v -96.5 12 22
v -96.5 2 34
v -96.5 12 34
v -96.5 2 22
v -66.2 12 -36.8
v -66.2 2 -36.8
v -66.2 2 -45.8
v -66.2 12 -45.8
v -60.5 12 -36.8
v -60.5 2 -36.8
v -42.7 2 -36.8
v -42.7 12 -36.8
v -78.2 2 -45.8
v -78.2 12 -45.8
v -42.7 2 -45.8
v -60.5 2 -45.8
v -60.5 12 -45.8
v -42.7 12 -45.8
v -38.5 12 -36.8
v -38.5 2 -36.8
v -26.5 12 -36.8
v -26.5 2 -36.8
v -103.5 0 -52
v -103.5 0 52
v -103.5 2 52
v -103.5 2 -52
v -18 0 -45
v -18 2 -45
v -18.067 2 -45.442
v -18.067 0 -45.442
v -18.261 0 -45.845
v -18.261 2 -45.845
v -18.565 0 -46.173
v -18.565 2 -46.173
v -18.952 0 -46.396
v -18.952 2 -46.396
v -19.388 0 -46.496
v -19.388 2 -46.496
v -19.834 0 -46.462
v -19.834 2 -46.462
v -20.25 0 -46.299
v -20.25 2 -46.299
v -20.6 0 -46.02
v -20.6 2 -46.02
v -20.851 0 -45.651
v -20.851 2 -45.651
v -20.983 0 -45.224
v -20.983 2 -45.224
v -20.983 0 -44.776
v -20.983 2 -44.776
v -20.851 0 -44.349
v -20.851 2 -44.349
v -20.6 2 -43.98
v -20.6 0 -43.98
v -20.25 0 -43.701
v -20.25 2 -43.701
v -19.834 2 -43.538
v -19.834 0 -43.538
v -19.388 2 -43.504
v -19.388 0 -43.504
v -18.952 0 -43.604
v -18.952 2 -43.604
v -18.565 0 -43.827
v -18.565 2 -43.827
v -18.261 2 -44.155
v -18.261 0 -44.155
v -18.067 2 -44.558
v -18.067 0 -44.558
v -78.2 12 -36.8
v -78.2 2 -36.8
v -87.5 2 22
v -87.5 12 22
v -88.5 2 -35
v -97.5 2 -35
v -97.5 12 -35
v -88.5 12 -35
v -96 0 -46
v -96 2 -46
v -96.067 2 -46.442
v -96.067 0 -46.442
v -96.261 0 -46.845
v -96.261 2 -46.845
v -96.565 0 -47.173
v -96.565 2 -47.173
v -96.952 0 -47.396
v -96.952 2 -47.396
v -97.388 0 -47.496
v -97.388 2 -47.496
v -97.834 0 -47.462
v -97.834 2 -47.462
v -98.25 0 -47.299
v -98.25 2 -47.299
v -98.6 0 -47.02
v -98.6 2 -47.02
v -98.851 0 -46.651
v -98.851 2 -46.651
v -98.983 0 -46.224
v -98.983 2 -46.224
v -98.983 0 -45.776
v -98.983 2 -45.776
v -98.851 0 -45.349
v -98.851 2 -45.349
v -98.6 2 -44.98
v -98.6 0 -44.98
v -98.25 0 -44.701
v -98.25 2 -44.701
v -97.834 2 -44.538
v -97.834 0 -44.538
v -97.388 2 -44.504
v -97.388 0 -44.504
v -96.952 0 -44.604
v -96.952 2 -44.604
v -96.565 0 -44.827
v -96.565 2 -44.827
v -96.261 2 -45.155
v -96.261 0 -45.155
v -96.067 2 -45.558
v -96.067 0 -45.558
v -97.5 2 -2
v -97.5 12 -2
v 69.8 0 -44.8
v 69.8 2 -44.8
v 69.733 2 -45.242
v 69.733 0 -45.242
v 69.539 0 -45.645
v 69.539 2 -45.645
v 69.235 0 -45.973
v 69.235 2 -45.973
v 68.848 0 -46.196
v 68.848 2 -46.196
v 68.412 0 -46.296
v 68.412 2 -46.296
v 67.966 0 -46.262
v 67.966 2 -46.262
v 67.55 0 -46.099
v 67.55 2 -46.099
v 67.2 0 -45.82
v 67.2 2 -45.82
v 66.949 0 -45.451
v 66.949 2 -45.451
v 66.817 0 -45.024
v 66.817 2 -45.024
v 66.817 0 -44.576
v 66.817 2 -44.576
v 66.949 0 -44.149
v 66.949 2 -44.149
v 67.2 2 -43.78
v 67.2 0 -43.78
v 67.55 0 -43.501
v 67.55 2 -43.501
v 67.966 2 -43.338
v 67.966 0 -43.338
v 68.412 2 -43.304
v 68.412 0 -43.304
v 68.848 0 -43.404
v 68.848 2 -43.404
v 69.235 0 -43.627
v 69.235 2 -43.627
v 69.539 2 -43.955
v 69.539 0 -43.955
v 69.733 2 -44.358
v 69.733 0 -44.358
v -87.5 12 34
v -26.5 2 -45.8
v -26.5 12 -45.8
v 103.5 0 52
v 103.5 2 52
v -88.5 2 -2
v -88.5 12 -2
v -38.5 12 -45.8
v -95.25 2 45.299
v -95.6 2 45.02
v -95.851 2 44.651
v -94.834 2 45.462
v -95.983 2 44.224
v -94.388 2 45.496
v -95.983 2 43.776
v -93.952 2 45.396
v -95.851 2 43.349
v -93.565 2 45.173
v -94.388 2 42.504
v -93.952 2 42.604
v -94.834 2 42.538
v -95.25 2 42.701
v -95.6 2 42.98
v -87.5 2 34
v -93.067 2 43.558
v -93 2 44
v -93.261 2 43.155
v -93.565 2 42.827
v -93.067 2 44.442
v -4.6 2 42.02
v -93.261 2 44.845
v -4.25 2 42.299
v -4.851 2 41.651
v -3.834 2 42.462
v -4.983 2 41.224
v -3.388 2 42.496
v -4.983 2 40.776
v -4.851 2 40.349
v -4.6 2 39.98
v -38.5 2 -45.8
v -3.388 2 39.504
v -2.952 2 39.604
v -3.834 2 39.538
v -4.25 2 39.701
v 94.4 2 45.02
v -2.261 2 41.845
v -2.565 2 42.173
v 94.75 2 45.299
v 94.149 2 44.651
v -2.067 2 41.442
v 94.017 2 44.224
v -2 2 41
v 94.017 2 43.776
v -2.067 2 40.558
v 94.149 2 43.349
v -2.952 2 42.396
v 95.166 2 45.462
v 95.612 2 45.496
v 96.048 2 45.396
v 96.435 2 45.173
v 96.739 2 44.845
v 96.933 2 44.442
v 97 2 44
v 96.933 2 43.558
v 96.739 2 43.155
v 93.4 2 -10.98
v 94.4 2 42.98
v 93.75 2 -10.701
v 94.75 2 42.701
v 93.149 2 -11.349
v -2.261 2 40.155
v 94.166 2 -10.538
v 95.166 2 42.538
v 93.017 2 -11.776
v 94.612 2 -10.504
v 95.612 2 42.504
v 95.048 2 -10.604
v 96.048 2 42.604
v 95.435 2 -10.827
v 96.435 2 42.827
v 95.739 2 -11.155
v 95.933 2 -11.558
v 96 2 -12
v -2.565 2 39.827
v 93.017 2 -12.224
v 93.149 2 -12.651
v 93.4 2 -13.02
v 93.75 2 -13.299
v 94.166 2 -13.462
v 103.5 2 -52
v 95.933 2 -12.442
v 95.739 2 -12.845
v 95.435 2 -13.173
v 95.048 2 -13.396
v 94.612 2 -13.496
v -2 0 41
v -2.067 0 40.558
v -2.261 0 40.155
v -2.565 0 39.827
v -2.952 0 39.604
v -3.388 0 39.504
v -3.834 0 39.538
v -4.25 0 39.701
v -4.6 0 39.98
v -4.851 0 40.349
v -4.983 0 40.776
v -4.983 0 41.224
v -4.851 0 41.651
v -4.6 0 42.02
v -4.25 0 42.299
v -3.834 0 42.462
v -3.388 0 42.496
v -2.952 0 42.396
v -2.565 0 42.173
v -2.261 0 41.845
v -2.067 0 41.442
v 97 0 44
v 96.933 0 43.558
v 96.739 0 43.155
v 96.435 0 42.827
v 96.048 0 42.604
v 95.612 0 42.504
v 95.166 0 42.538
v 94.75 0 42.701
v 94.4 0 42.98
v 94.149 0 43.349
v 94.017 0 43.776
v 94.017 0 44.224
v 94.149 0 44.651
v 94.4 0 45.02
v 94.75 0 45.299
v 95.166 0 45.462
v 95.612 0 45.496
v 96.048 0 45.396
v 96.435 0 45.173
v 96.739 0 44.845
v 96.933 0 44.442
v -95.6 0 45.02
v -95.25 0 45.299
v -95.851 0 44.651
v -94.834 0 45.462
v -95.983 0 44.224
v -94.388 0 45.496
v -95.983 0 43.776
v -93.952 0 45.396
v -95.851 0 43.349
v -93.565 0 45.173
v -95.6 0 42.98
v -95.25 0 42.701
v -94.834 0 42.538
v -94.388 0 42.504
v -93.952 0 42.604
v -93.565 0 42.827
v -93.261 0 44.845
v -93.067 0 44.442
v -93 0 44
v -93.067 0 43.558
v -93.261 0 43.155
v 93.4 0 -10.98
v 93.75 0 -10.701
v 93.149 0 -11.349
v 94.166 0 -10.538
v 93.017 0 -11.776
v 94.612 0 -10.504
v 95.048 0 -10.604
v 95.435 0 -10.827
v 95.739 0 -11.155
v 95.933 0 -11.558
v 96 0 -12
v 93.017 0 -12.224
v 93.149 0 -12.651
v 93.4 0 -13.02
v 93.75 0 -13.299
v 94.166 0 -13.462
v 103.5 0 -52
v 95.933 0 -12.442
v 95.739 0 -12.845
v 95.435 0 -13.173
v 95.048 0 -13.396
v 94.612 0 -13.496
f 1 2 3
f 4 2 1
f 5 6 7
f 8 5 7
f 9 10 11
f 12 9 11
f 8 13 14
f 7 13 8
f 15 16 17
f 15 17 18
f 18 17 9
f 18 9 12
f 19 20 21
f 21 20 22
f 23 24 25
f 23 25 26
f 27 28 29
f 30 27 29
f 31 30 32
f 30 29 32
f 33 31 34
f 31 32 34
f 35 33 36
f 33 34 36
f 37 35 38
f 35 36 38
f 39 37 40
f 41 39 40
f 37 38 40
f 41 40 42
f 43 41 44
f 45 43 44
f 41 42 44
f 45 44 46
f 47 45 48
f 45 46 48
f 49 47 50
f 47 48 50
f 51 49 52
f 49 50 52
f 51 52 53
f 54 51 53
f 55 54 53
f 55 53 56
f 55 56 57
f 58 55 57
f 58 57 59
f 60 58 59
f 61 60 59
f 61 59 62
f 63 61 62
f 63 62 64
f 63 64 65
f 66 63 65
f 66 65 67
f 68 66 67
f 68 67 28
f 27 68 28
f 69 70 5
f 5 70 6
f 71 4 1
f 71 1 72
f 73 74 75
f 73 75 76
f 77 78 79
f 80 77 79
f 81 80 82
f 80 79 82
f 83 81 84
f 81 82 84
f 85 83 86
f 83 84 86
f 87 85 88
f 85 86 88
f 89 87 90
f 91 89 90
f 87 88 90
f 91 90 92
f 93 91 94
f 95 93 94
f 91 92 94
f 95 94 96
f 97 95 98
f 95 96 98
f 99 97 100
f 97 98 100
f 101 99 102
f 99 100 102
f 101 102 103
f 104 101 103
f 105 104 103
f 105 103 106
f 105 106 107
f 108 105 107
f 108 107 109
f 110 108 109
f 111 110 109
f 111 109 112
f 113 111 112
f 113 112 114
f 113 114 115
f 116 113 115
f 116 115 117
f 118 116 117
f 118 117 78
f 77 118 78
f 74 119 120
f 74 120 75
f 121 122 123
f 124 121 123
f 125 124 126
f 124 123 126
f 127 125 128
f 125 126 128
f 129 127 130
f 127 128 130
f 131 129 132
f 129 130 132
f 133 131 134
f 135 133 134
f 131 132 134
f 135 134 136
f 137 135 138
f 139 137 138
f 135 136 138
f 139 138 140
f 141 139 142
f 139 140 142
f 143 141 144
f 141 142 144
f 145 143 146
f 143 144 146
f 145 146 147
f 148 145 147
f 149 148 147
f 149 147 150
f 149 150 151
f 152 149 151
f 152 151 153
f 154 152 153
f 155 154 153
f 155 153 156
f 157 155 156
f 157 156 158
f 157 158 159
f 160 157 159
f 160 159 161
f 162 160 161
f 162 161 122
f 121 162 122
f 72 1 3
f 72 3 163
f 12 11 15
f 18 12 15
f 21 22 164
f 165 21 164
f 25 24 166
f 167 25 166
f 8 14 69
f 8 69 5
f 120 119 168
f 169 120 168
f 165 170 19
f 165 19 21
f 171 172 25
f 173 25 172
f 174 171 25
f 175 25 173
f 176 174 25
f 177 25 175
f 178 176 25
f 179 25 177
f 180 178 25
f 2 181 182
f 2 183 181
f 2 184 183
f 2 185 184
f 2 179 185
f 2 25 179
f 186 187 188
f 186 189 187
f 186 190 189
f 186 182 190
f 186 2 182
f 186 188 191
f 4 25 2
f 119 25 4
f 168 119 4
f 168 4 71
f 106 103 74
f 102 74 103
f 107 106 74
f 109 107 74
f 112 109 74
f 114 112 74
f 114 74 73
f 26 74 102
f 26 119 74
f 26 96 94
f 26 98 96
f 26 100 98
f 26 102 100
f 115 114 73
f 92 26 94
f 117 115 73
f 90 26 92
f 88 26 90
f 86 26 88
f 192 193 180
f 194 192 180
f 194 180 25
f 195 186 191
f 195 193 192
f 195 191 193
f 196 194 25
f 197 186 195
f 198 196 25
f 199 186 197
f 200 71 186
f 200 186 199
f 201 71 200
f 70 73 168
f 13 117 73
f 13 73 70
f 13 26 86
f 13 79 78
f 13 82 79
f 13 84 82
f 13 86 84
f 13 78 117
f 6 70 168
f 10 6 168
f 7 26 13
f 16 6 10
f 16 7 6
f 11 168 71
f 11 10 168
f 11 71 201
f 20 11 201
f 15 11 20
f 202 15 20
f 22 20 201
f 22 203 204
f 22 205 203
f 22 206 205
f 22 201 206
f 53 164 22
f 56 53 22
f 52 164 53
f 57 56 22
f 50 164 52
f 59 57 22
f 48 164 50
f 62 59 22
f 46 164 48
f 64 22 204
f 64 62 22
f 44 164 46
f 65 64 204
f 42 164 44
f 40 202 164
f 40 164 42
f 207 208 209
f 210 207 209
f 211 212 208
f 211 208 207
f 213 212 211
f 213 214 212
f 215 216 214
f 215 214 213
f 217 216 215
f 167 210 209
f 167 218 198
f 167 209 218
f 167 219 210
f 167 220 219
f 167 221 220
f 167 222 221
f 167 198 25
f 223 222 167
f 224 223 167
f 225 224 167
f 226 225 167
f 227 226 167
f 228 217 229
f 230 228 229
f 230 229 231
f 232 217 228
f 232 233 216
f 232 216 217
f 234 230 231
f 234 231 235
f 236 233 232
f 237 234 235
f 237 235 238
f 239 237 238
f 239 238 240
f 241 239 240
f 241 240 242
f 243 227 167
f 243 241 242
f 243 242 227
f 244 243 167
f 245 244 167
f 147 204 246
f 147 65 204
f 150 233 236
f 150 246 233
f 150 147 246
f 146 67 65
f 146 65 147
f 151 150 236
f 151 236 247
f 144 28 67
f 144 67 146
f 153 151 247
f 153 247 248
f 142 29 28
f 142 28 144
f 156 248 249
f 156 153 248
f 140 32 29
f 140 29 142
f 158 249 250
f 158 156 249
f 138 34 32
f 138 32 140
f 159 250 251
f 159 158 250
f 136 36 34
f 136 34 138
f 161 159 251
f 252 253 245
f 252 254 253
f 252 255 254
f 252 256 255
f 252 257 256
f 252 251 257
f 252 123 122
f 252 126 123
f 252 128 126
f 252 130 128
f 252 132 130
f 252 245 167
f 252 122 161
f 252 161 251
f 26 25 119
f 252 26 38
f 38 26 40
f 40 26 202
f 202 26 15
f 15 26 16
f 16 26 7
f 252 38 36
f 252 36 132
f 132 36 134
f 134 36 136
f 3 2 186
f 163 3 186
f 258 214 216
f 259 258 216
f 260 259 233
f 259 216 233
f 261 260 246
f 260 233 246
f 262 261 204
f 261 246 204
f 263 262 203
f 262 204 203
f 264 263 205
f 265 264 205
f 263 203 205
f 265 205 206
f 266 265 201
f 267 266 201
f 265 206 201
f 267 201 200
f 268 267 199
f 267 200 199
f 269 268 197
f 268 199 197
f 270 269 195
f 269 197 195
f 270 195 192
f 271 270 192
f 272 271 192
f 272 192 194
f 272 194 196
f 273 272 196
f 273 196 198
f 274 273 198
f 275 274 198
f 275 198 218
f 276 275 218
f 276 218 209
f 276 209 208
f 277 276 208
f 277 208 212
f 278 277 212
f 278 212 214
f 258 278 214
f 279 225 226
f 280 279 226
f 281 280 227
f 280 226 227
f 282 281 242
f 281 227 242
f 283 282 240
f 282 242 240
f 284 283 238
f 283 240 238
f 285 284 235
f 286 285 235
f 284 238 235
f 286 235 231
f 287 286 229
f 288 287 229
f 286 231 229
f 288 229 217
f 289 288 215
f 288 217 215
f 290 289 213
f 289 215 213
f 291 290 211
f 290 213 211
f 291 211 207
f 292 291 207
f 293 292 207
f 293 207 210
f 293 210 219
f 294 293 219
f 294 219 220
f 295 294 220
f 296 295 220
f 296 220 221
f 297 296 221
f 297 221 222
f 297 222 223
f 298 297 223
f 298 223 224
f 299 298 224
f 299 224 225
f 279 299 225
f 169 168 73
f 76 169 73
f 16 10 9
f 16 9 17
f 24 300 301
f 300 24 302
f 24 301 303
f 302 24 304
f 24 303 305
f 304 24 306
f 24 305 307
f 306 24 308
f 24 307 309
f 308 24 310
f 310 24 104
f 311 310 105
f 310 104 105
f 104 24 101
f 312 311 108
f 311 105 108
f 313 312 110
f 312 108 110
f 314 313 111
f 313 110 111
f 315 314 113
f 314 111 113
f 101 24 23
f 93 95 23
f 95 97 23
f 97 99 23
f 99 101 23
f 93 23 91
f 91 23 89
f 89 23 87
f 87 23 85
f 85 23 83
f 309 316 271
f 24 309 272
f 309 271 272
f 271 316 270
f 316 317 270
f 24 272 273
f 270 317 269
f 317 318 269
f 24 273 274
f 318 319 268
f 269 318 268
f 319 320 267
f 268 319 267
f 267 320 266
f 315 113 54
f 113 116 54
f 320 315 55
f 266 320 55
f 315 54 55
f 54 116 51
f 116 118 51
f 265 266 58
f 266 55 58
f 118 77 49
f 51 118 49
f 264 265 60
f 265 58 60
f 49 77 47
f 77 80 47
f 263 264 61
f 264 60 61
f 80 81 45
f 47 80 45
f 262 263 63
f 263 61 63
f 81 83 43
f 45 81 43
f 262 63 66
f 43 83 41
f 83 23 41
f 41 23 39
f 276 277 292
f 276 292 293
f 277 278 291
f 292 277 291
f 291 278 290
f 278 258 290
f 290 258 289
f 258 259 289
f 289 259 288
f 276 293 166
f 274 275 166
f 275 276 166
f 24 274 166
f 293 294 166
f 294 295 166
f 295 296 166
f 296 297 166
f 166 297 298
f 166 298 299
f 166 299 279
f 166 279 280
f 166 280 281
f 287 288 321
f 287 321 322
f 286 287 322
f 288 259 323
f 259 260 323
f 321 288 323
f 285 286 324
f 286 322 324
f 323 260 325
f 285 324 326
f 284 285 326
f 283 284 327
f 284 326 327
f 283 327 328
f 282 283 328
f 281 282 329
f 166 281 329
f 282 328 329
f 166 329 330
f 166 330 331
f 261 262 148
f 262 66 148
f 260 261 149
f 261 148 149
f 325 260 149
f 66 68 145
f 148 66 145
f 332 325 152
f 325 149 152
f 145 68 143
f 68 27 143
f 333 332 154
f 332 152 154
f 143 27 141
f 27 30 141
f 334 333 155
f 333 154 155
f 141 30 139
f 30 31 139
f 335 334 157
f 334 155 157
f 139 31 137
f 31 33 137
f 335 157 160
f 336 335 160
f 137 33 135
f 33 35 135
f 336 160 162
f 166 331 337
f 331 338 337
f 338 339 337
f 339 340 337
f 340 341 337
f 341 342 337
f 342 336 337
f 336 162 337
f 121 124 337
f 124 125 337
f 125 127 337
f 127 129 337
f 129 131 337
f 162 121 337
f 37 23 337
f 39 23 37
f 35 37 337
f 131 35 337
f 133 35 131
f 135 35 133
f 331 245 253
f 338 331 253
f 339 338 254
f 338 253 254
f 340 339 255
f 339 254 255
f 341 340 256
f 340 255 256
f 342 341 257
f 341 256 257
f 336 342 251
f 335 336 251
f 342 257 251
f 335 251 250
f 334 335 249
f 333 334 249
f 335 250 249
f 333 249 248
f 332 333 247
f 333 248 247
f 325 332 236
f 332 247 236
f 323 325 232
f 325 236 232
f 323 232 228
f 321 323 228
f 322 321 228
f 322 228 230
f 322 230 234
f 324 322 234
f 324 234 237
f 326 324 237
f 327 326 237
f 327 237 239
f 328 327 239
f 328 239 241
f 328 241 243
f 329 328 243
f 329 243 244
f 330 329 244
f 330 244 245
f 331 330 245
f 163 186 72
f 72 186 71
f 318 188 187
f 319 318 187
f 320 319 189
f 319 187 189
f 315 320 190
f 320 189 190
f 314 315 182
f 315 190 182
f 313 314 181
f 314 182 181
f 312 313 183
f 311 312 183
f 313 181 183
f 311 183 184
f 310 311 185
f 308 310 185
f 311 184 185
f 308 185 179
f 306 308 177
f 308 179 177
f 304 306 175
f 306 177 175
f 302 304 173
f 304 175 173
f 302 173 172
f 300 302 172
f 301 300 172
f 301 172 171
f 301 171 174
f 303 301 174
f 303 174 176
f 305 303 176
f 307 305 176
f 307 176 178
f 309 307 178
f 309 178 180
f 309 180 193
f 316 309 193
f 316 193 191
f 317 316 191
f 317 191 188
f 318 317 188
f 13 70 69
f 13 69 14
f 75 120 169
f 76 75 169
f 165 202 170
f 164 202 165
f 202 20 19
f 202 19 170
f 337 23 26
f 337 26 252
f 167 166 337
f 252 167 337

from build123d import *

# Parameters (mm, degrees)
ESQUISSE1_W             = 207
ESQUISSE1_H             = 104
BOSS_EXTRU_1_DEPTH      = 2
ESQUISSE3_R             = 1.5
ENL_V_MAT_EXTRU_1_DEPTH = 3
ESQUISSE4_W             = 9
ESQUISSE4_H             = 33
ESQUISSE4_H_2           = 12
ESQUISSE4_W_2           = 12
ESQUISSE4_H_3           = 9
ESQUISSE4_W_3           = 17.8
BOSS_EXTRU_2_DEPTH      = 10


with BuildPart() as part:
    # Esquisse1 → Boss.-Extru.1 (new body)
    with BuildSketch(Plane(origin=(0, 0, 0), x_dir=(1, 0, 0), z_dir=(0, 1, 0))):
        Rectangle(ESQUISSE1_W, ESQUISSE1_H)
    extrude(amount=BOSS_EXTRU_1_DEPTH)

    # Esquisse3 → Enlèv. mat.-Extru.1 (cut, through all)
    with BuildSketch(Plane(origin=(0, 2, 0), x_dir=(1, 0, 0), z_dir=(0, 1, 0))):
        with Locations((-97.5, 46)):
            Circle(ESQUISSE3_R)
        with Locations((-19.5, 45)):
            Circle(ESQUISSE3_R)
        with Locations((68.3, 44.8)):
            Circle(ESQUISSE3_R)
        with Locations((94.5, 12)):
            Circle(ESQUISSE3_R)
        with Locations((95.5, -44)):
            Circle(ESQUISSE3_R)
        with Locations((-3.5, -41)):
            Circle(ESQUISSE3_R)
        with Locations((-94.5, -44)):
            Circle(ESQUISSE3_R)
    extrude(amount=-ENL_V_MAT_EXTRU_1_DEPTH, mode=Mode.SUBTRACT)

    # Esquisse4 → Boss.-Extru.2 (add)
    with BuildSketch(Plane(origin=(0, 2, 0), x_dir=(1, 0, 0), z_dir=(0, 1, 0))):
        with Locations((-93, 18.5)):
            Rectangle(ESQUISSE4_W, ESQUISSE4_H)
        with Locations((-92, -28)):
            Rectangle(ESQUISSE4_W, ESQUISSE4_H_2)
        with Locations((-72.2, 41.3)):
            Rectangle(ESQUISSE4_W_2, ESQUISSE4_H_3)
        with Locations((-51.6, 41.3)):
            Rectangle(ESQUISSE4_W_3, ESQUISSE4_H_3)
        with Locations((-32.5, 41.3)):
            Rectangle(ESQUISSE4_W_2, ESQUISSE4_H_3)
    extrude(amount=BOSS_EXTRU_2_DEPTH)


solid = part.part
